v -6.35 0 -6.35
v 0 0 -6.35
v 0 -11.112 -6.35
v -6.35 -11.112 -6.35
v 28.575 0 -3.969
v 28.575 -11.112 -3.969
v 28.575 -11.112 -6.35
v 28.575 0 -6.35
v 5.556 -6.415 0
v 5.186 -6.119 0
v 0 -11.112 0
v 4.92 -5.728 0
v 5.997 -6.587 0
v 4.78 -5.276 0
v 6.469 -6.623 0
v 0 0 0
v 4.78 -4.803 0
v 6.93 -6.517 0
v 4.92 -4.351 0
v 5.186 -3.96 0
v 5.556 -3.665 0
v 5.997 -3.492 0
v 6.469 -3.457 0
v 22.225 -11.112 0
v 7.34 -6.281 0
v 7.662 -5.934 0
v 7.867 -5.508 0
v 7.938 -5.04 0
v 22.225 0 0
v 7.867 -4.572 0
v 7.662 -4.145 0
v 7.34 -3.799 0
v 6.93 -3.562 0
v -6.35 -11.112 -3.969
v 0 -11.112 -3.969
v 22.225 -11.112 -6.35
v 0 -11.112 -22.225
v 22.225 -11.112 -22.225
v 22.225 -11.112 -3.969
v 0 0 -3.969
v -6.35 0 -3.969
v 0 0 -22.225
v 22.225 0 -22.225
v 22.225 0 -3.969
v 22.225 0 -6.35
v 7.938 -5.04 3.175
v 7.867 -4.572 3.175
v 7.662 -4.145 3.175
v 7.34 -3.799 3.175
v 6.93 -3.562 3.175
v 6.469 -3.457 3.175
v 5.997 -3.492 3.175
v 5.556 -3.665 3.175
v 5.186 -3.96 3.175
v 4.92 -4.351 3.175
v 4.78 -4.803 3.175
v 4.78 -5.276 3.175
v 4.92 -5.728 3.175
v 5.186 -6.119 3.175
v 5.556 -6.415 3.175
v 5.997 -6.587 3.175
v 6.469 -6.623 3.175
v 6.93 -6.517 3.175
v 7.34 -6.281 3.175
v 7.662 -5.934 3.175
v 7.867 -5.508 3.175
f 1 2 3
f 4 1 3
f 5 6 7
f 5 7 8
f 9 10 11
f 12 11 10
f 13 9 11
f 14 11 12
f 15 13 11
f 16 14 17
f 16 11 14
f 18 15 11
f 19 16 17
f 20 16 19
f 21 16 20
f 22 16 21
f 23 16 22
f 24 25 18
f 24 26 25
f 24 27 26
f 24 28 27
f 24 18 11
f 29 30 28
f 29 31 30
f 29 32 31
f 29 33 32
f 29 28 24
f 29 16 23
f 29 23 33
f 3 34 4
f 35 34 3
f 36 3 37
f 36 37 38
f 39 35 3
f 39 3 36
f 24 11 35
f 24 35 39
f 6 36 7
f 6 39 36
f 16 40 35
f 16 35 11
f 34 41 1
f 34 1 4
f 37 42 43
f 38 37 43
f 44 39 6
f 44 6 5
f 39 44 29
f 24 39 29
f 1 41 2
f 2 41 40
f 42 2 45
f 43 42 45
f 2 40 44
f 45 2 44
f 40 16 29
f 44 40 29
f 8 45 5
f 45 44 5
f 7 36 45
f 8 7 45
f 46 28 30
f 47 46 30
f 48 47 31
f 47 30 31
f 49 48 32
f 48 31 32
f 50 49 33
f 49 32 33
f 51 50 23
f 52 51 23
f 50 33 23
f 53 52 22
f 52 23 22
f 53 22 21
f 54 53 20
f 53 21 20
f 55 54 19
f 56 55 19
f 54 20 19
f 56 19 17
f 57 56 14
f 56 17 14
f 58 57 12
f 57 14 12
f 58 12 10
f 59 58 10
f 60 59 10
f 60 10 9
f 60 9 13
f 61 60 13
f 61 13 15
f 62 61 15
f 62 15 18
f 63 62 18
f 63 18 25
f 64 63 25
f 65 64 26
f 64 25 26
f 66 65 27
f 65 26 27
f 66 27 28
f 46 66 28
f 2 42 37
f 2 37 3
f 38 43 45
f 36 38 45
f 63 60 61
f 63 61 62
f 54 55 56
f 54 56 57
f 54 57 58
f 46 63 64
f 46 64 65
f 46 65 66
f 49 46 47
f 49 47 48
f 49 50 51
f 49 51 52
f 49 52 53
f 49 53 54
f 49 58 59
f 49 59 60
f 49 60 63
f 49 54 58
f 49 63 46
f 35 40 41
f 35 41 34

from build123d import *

# Parameters (mm, degrees)
F0_W     = 22.225
F0_H     = 22.225
F1_DEPTH = 11.1125
F2_W     = 11.1125
F2_H     = 2.38125
F3_DEPTH = 6.35
F4_W     = 11.1125
F4_H     = 2.38125
F5_DEPTH = 6.35
F6_R     = 1.5875
F7_DEPTH = 3.175


with BuildPart() as f1:
    # F0 (on Front) → F1 (new body)
    with BuildSketch(Plane.XZ):
        with Locations((11.1125, -11.1125)):
            Rectangle(F0_W, F0_H)
    extrude(amount=F1_DEPTH)

    # F2 (on face) → F3 (join)
    with BuildSketch(Plane.YZ.offset(22.225)):
        with Locations((-5.55625, -5.159375)):
            Rectangle(F2_W, F2_H)
    extrude(amount=F3_DEPTH)

    # F4 (on face) → F5 (join)
    with BuildSketch(Plane(origin=(0, 0, 0), x_dir=(0, -1, 0), z_dir=(-1, 0, 0))):
        with Locations((5.55625, -5.159375)):
            Rectangle(F4_W, F4_H)
    extrude(amount=F5_DEPTH)

    # F6 (on face) → F7 (join)
    with BuildSketch(Plane.XY):
        with Locations((6.35, -5.039688)):
            Circle(F6_R)
    extrude(amount=F7_DEPTH)


solid = f1.part
